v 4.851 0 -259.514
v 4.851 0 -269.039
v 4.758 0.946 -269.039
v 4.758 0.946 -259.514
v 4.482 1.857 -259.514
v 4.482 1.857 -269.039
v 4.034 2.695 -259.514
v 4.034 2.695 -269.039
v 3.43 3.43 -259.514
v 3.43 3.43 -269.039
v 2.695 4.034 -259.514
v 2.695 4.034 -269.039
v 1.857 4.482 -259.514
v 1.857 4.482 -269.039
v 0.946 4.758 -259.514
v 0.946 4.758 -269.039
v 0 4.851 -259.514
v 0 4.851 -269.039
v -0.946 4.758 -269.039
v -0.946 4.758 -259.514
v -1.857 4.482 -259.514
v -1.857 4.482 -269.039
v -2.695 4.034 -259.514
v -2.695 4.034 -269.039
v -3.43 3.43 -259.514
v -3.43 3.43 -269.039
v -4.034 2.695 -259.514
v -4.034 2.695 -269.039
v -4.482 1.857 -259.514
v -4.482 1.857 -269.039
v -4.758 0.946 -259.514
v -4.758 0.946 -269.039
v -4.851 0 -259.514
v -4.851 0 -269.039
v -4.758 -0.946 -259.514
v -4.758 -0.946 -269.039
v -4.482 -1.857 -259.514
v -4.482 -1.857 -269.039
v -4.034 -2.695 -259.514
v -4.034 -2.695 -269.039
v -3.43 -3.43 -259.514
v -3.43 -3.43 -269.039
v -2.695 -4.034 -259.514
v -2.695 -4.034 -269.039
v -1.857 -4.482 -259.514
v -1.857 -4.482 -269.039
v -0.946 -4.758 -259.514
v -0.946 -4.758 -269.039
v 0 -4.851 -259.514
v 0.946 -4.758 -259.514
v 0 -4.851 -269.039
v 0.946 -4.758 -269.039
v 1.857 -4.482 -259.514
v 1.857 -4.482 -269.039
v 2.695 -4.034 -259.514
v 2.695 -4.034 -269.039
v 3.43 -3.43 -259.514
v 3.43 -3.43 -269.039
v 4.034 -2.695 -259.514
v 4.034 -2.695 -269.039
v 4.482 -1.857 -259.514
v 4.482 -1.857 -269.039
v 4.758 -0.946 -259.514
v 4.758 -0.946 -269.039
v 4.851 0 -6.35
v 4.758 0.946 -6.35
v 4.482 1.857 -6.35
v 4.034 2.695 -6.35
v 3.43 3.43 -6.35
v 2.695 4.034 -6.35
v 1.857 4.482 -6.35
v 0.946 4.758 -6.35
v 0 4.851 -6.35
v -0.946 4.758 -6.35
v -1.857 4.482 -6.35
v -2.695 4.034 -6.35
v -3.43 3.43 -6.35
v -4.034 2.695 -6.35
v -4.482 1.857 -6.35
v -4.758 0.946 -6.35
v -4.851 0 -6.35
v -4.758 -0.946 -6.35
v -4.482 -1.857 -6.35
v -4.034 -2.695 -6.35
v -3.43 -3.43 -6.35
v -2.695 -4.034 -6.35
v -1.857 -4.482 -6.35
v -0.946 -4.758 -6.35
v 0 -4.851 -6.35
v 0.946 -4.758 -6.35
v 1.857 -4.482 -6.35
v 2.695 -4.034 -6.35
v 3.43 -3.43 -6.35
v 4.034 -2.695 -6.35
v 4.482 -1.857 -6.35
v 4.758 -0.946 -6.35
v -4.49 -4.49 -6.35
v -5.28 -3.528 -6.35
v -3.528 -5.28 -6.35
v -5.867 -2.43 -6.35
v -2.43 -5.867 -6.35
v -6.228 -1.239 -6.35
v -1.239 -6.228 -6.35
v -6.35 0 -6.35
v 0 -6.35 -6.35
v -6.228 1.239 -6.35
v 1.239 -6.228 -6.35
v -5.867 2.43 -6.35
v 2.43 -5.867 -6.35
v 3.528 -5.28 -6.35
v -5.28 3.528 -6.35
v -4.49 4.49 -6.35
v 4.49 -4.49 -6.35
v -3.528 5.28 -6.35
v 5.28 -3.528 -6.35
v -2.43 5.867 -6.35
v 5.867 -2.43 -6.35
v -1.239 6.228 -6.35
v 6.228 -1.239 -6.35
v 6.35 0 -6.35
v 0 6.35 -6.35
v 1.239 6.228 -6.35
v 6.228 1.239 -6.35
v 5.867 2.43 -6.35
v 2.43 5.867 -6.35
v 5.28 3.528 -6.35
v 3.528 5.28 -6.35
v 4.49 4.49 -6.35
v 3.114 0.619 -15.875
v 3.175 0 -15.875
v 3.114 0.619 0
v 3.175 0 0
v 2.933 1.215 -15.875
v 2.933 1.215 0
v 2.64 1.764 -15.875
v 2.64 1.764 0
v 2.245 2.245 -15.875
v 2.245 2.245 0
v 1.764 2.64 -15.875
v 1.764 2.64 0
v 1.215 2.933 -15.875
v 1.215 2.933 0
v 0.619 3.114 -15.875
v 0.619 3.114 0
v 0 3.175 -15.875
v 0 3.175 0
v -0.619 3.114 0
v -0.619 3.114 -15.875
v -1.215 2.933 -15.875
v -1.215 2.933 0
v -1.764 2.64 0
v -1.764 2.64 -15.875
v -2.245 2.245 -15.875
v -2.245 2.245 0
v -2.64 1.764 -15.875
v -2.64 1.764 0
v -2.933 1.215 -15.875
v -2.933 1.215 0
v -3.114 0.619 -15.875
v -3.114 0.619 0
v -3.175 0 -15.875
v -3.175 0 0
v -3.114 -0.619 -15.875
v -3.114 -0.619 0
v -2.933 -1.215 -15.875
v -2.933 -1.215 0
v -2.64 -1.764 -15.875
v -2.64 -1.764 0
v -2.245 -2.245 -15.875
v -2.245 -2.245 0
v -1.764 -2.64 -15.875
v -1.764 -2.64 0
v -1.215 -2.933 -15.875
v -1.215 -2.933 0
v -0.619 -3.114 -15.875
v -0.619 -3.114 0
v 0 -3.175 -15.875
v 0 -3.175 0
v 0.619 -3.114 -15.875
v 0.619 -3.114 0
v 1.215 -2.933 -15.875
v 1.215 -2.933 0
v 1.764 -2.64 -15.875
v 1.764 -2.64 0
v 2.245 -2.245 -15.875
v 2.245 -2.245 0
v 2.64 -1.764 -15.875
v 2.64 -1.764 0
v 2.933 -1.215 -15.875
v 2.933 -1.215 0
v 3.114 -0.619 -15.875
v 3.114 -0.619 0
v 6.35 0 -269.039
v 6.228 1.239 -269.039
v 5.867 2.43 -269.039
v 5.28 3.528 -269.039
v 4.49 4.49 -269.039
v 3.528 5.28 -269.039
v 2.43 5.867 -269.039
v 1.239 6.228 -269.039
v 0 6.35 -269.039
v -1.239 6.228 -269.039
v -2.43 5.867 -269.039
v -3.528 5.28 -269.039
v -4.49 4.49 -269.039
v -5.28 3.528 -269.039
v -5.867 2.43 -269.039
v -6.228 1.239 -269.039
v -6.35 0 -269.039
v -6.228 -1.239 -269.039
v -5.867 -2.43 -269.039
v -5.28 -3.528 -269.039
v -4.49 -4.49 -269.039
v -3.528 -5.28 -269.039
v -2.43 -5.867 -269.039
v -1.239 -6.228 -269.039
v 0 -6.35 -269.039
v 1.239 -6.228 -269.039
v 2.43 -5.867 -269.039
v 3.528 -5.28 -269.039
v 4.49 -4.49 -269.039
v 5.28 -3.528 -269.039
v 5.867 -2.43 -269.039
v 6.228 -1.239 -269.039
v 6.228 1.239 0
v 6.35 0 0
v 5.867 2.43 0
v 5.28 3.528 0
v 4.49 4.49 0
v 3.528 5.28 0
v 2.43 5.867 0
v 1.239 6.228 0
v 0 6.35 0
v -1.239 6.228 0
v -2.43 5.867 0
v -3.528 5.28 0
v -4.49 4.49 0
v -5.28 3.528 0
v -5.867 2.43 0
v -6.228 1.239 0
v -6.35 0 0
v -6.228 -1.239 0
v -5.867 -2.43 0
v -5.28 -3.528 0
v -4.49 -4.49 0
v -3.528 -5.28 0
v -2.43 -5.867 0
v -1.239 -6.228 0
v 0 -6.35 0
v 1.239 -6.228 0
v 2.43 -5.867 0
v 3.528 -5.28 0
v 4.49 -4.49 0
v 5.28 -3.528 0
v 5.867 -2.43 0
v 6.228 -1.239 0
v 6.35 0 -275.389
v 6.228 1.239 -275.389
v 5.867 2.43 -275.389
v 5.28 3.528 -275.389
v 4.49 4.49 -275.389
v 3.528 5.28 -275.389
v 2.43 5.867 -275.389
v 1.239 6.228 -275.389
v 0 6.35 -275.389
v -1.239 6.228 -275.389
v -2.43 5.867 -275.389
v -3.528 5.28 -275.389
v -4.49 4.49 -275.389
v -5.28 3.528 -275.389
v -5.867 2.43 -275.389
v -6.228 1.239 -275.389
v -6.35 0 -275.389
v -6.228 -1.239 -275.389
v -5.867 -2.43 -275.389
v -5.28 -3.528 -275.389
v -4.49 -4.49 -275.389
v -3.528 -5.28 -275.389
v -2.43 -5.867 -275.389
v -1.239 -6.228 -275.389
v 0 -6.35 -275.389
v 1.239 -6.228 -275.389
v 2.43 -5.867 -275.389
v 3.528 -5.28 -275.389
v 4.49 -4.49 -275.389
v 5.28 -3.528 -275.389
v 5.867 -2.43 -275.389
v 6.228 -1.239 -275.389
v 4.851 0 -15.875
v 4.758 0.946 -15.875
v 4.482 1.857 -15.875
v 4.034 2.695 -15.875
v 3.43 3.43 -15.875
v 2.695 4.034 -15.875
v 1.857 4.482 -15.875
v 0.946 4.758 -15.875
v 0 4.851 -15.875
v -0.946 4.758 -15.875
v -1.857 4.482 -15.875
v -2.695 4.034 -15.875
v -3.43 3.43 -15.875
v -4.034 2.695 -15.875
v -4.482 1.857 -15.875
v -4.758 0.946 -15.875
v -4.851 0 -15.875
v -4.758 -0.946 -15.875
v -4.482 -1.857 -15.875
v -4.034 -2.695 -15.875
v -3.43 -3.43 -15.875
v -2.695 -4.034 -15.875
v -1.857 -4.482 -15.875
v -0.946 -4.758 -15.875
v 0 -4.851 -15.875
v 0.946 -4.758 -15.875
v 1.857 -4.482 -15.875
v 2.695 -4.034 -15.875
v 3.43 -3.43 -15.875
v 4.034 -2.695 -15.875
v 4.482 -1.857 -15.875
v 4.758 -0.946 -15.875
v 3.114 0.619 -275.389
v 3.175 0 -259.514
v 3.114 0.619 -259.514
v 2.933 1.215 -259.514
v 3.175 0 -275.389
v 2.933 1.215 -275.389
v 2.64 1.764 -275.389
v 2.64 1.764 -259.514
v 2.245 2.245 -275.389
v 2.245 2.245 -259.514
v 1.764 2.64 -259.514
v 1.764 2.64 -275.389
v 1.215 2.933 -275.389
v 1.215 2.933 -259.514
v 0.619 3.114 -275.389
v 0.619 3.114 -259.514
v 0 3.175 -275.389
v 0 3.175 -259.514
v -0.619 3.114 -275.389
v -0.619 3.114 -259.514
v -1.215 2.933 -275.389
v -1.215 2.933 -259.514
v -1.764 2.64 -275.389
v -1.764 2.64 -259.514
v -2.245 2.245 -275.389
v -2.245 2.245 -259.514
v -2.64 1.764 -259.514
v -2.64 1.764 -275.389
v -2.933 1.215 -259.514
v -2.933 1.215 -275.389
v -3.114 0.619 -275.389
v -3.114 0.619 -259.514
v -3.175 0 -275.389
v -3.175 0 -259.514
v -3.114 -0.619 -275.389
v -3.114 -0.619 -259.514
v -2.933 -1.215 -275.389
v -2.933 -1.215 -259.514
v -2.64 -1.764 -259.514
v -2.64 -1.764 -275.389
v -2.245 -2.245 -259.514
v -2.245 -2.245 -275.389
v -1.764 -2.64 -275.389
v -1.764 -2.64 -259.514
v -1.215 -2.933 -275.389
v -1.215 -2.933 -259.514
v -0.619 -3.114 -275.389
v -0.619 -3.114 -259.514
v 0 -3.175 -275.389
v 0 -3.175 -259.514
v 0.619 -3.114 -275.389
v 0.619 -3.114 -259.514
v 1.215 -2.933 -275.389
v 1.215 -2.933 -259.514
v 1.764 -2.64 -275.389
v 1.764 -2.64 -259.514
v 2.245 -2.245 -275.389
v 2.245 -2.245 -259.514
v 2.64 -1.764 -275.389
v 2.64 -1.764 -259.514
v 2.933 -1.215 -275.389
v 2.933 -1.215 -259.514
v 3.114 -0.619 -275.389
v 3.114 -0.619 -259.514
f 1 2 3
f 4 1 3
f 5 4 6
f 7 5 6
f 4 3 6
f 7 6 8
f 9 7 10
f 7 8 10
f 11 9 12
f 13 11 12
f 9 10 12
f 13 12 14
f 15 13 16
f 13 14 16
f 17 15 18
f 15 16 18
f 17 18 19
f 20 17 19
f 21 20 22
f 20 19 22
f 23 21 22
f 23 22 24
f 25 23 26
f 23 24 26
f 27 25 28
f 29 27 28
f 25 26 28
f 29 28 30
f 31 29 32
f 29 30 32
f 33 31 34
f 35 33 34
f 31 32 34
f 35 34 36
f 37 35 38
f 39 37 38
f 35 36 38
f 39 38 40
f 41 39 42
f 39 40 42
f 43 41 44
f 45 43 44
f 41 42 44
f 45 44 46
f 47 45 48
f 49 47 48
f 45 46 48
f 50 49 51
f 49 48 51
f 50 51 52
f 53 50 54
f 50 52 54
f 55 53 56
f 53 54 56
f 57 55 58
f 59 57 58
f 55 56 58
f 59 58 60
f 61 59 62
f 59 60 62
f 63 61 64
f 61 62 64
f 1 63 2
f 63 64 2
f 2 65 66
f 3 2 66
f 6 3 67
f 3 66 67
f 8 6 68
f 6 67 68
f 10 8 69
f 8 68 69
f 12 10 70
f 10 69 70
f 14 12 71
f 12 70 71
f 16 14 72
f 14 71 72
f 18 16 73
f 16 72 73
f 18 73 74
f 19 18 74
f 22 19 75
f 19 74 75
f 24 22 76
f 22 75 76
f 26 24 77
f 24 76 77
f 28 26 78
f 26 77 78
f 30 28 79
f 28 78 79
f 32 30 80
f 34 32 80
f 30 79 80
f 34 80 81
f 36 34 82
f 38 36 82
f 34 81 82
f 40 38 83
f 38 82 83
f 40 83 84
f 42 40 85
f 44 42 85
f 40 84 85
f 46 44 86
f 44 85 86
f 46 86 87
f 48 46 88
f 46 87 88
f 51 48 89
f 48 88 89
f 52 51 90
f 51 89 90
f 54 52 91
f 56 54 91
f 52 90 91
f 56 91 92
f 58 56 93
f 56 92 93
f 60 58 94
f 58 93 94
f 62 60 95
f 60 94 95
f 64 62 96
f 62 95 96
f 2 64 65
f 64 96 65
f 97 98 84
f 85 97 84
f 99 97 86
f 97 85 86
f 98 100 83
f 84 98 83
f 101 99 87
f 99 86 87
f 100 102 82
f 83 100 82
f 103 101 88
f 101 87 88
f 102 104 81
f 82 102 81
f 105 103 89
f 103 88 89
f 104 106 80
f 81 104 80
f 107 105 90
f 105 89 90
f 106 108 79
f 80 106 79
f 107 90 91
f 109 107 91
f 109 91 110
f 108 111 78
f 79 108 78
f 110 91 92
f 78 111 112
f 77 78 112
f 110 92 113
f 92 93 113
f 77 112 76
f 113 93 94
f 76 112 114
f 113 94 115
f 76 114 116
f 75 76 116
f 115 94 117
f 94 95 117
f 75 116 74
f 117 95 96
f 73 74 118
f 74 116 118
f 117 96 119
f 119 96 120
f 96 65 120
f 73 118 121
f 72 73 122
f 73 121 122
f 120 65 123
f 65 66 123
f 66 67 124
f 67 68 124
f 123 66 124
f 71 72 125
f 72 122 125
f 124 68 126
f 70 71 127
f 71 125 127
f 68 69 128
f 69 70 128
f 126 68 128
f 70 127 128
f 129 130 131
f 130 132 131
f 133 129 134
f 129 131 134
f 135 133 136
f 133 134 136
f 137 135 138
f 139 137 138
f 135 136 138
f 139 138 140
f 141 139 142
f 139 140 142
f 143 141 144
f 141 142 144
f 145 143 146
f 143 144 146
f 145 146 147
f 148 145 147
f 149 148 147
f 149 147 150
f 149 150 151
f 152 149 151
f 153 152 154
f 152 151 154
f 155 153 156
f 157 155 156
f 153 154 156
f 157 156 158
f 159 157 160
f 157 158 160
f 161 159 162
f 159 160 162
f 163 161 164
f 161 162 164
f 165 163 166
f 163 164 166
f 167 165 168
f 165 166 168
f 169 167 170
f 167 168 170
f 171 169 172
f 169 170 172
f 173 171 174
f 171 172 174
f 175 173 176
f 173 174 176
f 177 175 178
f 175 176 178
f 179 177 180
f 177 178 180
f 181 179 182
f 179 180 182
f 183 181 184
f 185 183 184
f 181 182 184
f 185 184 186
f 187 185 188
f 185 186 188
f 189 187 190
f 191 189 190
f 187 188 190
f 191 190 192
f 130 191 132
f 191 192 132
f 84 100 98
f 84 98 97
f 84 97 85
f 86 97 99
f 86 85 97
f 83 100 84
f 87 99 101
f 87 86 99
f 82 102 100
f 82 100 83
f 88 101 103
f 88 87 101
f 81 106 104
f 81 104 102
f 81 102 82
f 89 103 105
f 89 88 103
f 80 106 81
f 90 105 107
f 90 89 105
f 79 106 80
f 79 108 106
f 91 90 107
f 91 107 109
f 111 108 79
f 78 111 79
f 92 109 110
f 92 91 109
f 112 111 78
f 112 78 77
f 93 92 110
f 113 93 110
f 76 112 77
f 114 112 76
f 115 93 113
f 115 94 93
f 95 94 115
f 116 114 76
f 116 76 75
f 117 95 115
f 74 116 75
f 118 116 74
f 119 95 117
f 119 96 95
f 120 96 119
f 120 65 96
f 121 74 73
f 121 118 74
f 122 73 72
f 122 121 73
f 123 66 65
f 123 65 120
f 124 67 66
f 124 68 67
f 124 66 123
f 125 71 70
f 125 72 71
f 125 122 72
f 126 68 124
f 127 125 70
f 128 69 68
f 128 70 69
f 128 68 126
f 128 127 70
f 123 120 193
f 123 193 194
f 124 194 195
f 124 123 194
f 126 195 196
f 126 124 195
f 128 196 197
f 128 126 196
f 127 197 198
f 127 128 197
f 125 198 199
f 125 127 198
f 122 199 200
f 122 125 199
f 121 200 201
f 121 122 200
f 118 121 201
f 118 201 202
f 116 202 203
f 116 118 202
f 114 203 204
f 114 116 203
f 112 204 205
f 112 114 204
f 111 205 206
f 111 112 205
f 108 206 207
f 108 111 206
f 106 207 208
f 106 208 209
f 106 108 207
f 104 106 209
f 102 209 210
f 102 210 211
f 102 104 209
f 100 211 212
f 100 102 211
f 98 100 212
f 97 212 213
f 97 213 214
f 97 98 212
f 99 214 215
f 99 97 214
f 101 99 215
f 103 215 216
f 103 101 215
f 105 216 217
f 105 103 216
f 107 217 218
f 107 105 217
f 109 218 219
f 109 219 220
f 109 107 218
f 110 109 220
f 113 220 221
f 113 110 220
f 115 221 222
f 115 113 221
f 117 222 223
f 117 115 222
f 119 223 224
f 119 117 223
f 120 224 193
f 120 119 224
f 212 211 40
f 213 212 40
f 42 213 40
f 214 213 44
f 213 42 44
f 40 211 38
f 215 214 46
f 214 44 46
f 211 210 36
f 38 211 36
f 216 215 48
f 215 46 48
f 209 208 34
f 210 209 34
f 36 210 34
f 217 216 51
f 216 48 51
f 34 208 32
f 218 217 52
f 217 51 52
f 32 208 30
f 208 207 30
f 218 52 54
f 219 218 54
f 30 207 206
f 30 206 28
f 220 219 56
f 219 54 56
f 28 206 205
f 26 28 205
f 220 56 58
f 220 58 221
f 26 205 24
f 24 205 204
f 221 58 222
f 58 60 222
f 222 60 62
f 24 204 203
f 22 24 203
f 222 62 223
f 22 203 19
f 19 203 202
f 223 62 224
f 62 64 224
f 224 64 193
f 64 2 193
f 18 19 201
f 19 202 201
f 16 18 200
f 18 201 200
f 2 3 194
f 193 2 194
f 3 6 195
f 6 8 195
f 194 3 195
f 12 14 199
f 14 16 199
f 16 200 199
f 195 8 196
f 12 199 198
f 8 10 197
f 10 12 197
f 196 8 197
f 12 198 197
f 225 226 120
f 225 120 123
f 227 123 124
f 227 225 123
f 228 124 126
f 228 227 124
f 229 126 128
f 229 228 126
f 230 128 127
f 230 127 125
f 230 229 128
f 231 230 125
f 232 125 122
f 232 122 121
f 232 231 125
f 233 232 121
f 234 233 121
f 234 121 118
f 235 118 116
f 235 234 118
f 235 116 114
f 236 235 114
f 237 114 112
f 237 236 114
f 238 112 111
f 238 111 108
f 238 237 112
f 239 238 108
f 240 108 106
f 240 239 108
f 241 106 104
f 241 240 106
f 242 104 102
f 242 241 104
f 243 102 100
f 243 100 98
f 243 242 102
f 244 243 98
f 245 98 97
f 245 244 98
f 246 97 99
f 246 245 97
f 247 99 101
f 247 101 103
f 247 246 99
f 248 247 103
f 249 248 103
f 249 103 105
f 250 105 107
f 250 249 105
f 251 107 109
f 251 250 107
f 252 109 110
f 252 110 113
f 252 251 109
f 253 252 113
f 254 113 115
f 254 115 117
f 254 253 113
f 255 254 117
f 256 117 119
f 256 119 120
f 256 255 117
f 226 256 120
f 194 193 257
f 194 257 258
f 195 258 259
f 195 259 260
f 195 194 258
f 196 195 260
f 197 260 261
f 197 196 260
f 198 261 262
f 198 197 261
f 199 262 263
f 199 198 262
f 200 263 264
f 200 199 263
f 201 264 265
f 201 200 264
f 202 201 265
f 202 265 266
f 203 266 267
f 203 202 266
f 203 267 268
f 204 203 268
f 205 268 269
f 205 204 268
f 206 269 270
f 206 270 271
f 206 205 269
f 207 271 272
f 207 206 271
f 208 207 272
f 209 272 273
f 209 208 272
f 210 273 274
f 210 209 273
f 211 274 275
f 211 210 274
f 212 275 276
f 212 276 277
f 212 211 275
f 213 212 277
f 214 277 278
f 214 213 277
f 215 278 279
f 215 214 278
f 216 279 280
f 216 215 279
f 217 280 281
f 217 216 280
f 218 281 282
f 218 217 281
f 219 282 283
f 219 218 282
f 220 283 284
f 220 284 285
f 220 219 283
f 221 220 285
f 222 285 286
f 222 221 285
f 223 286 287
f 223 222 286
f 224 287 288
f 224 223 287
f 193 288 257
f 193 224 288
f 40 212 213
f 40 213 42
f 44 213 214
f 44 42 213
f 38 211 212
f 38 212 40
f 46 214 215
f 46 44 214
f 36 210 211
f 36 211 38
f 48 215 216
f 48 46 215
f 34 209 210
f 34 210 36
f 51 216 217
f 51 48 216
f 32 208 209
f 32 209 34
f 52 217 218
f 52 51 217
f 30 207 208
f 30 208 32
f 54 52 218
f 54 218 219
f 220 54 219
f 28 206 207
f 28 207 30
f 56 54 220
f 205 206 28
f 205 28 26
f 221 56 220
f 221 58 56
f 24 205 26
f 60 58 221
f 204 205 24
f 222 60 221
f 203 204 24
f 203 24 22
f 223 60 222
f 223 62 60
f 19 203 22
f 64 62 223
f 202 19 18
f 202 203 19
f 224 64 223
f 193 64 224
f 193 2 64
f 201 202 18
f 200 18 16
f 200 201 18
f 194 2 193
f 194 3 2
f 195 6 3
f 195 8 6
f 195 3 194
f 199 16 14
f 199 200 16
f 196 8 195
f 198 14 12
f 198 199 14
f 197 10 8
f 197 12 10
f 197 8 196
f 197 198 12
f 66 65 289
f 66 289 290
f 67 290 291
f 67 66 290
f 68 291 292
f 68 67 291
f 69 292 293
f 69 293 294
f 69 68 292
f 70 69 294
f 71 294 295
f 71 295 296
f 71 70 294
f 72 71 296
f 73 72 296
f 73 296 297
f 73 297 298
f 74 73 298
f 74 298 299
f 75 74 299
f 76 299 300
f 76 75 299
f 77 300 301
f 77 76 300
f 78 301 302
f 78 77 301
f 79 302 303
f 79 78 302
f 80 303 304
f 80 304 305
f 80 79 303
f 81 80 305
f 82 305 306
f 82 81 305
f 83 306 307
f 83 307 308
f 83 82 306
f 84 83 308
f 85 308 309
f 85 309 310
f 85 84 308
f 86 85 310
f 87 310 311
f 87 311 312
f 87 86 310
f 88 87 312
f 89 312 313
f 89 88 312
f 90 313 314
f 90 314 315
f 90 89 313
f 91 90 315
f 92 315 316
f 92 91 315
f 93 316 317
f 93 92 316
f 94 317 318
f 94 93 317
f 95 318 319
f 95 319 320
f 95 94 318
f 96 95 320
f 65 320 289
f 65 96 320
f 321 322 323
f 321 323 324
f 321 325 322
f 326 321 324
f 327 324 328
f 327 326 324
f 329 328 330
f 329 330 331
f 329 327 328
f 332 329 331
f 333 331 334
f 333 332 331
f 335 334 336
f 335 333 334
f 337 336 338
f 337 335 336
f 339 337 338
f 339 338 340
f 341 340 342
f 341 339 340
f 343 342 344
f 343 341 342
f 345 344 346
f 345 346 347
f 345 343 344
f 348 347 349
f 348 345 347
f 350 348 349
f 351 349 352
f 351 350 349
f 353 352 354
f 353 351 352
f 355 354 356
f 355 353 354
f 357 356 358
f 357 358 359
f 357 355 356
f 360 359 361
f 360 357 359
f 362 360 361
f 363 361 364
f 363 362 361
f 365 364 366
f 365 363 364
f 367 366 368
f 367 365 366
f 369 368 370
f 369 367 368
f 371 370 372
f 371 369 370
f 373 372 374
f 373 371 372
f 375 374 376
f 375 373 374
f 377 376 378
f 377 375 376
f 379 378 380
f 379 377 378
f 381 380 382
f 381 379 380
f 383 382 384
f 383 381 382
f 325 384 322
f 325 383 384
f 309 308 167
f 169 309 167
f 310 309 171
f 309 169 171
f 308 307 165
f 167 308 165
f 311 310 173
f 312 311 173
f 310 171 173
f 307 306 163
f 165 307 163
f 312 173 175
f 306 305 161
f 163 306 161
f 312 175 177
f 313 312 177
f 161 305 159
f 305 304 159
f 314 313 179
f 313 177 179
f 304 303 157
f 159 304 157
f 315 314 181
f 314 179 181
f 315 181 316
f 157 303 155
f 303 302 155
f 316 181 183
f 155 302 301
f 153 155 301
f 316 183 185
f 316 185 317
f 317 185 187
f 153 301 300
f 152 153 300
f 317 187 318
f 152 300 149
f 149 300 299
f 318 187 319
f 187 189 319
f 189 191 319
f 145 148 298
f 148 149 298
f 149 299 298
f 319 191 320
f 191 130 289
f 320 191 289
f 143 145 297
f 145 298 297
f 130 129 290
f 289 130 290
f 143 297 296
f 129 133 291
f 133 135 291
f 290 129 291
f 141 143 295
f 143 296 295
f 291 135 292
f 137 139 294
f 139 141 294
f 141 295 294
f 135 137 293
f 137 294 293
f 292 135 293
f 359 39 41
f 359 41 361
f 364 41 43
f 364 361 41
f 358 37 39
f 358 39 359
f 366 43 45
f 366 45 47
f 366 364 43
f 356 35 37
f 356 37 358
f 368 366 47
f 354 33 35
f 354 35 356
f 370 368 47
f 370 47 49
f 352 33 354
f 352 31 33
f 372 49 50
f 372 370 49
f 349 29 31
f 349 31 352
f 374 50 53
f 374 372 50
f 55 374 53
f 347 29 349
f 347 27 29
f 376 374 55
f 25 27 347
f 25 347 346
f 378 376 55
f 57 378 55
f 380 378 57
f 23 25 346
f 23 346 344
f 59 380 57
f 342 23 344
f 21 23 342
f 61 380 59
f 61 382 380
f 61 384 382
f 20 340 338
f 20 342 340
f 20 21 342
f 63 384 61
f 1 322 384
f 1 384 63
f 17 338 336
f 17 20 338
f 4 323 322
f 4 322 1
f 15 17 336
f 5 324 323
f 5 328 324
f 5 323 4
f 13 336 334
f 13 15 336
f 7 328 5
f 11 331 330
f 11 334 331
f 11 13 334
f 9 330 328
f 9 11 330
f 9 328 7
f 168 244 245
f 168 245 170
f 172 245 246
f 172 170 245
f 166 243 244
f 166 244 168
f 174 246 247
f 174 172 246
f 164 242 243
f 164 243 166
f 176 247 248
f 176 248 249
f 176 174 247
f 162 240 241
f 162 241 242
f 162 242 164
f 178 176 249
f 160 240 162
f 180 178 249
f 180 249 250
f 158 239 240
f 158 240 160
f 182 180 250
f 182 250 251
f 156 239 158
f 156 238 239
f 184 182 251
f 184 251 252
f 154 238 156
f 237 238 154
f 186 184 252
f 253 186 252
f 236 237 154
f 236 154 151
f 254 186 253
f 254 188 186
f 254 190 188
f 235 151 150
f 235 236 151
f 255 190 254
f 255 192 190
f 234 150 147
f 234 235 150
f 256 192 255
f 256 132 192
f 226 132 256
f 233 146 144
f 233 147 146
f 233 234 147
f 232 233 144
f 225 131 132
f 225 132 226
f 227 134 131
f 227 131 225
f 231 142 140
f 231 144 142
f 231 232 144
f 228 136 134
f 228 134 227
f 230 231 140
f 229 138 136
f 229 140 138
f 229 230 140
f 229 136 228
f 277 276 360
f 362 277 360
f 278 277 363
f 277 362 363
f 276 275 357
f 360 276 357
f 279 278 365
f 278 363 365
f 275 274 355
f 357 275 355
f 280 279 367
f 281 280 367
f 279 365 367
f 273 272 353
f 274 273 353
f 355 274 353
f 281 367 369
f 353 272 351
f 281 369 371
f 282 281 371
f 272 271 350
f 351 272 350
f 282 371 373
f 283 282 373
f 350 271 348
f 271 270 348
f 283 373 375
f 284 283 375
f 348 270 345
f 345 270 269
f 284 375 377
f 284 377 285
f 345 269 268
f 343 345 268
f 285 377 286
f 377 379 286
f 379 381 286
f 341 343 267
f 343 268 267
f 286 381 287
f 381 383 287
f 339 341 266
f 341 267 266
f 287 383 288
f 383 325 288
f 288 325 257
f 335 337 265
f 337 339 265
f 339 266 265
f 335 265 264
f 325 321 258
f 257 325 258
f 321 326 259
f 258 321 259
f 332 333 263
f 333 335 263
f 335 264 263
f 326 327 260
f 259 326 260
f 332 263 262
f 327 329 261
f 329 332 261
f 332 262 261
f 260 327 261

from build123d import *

# Parameters (mm, degrees)
SKETCH1_R                 = 6.35
SKETCH1_R_2               = 4.8514
SKETCH1_R_3               = 3.175
THREADED_INSERT_1_1_DEPTH = 6.35
THREADED_START            = -6.35
SKETCH1_3_R               = 4.8514
SKETCH1_3_R_2             = 3.175
THREADED_INSERT_1_2_DEPTH = 9.525
TUBE_START                = -6.35
SKETCH1_4_R               = 6.35
SKETCH1_4_R_2             = 4.8514
TUBE_EXTRUDE_DEPTH        = 262.689418
THREADED_START_2          = -269.039418
SKETCH1_6_R               = 4.8514
SKETCH1_6_R_2             = 3.175
THREADED_INSERT_2_1_DEPTH = 9.525
SKETCH1_9_R               = 6.35
SKETCH1_9_R_2             = 4.8514
SKETCH1_9_R_3             = 3.175
THREADED_INSERT_2_2_DEPTH = 6.35


with BuildPart() as part:
    # Sketch1 → Threaded insert 1-1 (new body)
    # profile 1 of 2: a face of its own
    with BuildSketch(Plane.XY):
        Circle(SKETCH1_R)
        Circle(SKETCH1_R_2, mode=Mode.SUBTRACT)
    # profile 2 of 2: a face of its own
    with BuildSketch(Plane.XY):
        Circle(SKETCH1_R_2)
        Circle(SKETCH1_R_3, mode=Mode.SUBTRACT)
    extrude(amount=-THREADED_INSERT_1_1_DEPTH)

    # Sketch1<3> → Threaded insert 1-2 (add)
    with BuildSketch(Plane.XY.offset(THREADED_START)):
        Circle(SKETCH1_3_R)
        Circle(SKETCH1_3_R_2, mode=Mode.SUBTRACT)
    extrude(amount=-THREADED_INSERT_1_2_DEPTH)


with BuildPart() as body_2:
    # Sketch1<4> → Tube extrude (new body)
    with BuildSketch(Plane.XY.offset(TUBE_START)):
        Circle(SKETCH1_4_R)
        Circle(SKETCH1_4_R_2, mode=Mode.SUBTRACT)
    extrude(amount=-TUBE_EXTRUDE_DEPTH)


with BuildPart() as body_3:
    # Sketch1<6> → Threaded insert 2-1 (new body)
    with BuildSketch(Plane.XY.offset(THREADED_START_2)):
        Circle(SKETCH1_6_R)
        Circle(SKETCH1_6_R_2, mode=Mode.SUBTRACT)
    extrude(amount=THREADED_INSERT_2_1_DEPTH)


with BuildPart() as body_4:
    # Sketch1<9> → Threaded insert 2-2 (new body)
    # profile 1 of 2: a face of its own
    with BuildSketch(Plane.XY.offset(THREADED_START_2)):
        Circle(SKETCH1_9_R)
        Circle(SKETCH1_9_R_2, mode=Mode.SUBTRACT)
    # profile 2 of 2: a face of its own
    with BuildSketch(Plane.XY.offset(THREADED_START_2)):
        Circle(SKETCH1_9_R_2)
        Circle(SKETCH1_9_R_3, mode=Mode.SUBTRACT)
    extrude(amount=-THREADED_INSERT_2_2_DEPTH)

    # Combine1: union body 3
    add(body_3.part)


solid = Compound([part.part, body_2.part, body_4.part])
